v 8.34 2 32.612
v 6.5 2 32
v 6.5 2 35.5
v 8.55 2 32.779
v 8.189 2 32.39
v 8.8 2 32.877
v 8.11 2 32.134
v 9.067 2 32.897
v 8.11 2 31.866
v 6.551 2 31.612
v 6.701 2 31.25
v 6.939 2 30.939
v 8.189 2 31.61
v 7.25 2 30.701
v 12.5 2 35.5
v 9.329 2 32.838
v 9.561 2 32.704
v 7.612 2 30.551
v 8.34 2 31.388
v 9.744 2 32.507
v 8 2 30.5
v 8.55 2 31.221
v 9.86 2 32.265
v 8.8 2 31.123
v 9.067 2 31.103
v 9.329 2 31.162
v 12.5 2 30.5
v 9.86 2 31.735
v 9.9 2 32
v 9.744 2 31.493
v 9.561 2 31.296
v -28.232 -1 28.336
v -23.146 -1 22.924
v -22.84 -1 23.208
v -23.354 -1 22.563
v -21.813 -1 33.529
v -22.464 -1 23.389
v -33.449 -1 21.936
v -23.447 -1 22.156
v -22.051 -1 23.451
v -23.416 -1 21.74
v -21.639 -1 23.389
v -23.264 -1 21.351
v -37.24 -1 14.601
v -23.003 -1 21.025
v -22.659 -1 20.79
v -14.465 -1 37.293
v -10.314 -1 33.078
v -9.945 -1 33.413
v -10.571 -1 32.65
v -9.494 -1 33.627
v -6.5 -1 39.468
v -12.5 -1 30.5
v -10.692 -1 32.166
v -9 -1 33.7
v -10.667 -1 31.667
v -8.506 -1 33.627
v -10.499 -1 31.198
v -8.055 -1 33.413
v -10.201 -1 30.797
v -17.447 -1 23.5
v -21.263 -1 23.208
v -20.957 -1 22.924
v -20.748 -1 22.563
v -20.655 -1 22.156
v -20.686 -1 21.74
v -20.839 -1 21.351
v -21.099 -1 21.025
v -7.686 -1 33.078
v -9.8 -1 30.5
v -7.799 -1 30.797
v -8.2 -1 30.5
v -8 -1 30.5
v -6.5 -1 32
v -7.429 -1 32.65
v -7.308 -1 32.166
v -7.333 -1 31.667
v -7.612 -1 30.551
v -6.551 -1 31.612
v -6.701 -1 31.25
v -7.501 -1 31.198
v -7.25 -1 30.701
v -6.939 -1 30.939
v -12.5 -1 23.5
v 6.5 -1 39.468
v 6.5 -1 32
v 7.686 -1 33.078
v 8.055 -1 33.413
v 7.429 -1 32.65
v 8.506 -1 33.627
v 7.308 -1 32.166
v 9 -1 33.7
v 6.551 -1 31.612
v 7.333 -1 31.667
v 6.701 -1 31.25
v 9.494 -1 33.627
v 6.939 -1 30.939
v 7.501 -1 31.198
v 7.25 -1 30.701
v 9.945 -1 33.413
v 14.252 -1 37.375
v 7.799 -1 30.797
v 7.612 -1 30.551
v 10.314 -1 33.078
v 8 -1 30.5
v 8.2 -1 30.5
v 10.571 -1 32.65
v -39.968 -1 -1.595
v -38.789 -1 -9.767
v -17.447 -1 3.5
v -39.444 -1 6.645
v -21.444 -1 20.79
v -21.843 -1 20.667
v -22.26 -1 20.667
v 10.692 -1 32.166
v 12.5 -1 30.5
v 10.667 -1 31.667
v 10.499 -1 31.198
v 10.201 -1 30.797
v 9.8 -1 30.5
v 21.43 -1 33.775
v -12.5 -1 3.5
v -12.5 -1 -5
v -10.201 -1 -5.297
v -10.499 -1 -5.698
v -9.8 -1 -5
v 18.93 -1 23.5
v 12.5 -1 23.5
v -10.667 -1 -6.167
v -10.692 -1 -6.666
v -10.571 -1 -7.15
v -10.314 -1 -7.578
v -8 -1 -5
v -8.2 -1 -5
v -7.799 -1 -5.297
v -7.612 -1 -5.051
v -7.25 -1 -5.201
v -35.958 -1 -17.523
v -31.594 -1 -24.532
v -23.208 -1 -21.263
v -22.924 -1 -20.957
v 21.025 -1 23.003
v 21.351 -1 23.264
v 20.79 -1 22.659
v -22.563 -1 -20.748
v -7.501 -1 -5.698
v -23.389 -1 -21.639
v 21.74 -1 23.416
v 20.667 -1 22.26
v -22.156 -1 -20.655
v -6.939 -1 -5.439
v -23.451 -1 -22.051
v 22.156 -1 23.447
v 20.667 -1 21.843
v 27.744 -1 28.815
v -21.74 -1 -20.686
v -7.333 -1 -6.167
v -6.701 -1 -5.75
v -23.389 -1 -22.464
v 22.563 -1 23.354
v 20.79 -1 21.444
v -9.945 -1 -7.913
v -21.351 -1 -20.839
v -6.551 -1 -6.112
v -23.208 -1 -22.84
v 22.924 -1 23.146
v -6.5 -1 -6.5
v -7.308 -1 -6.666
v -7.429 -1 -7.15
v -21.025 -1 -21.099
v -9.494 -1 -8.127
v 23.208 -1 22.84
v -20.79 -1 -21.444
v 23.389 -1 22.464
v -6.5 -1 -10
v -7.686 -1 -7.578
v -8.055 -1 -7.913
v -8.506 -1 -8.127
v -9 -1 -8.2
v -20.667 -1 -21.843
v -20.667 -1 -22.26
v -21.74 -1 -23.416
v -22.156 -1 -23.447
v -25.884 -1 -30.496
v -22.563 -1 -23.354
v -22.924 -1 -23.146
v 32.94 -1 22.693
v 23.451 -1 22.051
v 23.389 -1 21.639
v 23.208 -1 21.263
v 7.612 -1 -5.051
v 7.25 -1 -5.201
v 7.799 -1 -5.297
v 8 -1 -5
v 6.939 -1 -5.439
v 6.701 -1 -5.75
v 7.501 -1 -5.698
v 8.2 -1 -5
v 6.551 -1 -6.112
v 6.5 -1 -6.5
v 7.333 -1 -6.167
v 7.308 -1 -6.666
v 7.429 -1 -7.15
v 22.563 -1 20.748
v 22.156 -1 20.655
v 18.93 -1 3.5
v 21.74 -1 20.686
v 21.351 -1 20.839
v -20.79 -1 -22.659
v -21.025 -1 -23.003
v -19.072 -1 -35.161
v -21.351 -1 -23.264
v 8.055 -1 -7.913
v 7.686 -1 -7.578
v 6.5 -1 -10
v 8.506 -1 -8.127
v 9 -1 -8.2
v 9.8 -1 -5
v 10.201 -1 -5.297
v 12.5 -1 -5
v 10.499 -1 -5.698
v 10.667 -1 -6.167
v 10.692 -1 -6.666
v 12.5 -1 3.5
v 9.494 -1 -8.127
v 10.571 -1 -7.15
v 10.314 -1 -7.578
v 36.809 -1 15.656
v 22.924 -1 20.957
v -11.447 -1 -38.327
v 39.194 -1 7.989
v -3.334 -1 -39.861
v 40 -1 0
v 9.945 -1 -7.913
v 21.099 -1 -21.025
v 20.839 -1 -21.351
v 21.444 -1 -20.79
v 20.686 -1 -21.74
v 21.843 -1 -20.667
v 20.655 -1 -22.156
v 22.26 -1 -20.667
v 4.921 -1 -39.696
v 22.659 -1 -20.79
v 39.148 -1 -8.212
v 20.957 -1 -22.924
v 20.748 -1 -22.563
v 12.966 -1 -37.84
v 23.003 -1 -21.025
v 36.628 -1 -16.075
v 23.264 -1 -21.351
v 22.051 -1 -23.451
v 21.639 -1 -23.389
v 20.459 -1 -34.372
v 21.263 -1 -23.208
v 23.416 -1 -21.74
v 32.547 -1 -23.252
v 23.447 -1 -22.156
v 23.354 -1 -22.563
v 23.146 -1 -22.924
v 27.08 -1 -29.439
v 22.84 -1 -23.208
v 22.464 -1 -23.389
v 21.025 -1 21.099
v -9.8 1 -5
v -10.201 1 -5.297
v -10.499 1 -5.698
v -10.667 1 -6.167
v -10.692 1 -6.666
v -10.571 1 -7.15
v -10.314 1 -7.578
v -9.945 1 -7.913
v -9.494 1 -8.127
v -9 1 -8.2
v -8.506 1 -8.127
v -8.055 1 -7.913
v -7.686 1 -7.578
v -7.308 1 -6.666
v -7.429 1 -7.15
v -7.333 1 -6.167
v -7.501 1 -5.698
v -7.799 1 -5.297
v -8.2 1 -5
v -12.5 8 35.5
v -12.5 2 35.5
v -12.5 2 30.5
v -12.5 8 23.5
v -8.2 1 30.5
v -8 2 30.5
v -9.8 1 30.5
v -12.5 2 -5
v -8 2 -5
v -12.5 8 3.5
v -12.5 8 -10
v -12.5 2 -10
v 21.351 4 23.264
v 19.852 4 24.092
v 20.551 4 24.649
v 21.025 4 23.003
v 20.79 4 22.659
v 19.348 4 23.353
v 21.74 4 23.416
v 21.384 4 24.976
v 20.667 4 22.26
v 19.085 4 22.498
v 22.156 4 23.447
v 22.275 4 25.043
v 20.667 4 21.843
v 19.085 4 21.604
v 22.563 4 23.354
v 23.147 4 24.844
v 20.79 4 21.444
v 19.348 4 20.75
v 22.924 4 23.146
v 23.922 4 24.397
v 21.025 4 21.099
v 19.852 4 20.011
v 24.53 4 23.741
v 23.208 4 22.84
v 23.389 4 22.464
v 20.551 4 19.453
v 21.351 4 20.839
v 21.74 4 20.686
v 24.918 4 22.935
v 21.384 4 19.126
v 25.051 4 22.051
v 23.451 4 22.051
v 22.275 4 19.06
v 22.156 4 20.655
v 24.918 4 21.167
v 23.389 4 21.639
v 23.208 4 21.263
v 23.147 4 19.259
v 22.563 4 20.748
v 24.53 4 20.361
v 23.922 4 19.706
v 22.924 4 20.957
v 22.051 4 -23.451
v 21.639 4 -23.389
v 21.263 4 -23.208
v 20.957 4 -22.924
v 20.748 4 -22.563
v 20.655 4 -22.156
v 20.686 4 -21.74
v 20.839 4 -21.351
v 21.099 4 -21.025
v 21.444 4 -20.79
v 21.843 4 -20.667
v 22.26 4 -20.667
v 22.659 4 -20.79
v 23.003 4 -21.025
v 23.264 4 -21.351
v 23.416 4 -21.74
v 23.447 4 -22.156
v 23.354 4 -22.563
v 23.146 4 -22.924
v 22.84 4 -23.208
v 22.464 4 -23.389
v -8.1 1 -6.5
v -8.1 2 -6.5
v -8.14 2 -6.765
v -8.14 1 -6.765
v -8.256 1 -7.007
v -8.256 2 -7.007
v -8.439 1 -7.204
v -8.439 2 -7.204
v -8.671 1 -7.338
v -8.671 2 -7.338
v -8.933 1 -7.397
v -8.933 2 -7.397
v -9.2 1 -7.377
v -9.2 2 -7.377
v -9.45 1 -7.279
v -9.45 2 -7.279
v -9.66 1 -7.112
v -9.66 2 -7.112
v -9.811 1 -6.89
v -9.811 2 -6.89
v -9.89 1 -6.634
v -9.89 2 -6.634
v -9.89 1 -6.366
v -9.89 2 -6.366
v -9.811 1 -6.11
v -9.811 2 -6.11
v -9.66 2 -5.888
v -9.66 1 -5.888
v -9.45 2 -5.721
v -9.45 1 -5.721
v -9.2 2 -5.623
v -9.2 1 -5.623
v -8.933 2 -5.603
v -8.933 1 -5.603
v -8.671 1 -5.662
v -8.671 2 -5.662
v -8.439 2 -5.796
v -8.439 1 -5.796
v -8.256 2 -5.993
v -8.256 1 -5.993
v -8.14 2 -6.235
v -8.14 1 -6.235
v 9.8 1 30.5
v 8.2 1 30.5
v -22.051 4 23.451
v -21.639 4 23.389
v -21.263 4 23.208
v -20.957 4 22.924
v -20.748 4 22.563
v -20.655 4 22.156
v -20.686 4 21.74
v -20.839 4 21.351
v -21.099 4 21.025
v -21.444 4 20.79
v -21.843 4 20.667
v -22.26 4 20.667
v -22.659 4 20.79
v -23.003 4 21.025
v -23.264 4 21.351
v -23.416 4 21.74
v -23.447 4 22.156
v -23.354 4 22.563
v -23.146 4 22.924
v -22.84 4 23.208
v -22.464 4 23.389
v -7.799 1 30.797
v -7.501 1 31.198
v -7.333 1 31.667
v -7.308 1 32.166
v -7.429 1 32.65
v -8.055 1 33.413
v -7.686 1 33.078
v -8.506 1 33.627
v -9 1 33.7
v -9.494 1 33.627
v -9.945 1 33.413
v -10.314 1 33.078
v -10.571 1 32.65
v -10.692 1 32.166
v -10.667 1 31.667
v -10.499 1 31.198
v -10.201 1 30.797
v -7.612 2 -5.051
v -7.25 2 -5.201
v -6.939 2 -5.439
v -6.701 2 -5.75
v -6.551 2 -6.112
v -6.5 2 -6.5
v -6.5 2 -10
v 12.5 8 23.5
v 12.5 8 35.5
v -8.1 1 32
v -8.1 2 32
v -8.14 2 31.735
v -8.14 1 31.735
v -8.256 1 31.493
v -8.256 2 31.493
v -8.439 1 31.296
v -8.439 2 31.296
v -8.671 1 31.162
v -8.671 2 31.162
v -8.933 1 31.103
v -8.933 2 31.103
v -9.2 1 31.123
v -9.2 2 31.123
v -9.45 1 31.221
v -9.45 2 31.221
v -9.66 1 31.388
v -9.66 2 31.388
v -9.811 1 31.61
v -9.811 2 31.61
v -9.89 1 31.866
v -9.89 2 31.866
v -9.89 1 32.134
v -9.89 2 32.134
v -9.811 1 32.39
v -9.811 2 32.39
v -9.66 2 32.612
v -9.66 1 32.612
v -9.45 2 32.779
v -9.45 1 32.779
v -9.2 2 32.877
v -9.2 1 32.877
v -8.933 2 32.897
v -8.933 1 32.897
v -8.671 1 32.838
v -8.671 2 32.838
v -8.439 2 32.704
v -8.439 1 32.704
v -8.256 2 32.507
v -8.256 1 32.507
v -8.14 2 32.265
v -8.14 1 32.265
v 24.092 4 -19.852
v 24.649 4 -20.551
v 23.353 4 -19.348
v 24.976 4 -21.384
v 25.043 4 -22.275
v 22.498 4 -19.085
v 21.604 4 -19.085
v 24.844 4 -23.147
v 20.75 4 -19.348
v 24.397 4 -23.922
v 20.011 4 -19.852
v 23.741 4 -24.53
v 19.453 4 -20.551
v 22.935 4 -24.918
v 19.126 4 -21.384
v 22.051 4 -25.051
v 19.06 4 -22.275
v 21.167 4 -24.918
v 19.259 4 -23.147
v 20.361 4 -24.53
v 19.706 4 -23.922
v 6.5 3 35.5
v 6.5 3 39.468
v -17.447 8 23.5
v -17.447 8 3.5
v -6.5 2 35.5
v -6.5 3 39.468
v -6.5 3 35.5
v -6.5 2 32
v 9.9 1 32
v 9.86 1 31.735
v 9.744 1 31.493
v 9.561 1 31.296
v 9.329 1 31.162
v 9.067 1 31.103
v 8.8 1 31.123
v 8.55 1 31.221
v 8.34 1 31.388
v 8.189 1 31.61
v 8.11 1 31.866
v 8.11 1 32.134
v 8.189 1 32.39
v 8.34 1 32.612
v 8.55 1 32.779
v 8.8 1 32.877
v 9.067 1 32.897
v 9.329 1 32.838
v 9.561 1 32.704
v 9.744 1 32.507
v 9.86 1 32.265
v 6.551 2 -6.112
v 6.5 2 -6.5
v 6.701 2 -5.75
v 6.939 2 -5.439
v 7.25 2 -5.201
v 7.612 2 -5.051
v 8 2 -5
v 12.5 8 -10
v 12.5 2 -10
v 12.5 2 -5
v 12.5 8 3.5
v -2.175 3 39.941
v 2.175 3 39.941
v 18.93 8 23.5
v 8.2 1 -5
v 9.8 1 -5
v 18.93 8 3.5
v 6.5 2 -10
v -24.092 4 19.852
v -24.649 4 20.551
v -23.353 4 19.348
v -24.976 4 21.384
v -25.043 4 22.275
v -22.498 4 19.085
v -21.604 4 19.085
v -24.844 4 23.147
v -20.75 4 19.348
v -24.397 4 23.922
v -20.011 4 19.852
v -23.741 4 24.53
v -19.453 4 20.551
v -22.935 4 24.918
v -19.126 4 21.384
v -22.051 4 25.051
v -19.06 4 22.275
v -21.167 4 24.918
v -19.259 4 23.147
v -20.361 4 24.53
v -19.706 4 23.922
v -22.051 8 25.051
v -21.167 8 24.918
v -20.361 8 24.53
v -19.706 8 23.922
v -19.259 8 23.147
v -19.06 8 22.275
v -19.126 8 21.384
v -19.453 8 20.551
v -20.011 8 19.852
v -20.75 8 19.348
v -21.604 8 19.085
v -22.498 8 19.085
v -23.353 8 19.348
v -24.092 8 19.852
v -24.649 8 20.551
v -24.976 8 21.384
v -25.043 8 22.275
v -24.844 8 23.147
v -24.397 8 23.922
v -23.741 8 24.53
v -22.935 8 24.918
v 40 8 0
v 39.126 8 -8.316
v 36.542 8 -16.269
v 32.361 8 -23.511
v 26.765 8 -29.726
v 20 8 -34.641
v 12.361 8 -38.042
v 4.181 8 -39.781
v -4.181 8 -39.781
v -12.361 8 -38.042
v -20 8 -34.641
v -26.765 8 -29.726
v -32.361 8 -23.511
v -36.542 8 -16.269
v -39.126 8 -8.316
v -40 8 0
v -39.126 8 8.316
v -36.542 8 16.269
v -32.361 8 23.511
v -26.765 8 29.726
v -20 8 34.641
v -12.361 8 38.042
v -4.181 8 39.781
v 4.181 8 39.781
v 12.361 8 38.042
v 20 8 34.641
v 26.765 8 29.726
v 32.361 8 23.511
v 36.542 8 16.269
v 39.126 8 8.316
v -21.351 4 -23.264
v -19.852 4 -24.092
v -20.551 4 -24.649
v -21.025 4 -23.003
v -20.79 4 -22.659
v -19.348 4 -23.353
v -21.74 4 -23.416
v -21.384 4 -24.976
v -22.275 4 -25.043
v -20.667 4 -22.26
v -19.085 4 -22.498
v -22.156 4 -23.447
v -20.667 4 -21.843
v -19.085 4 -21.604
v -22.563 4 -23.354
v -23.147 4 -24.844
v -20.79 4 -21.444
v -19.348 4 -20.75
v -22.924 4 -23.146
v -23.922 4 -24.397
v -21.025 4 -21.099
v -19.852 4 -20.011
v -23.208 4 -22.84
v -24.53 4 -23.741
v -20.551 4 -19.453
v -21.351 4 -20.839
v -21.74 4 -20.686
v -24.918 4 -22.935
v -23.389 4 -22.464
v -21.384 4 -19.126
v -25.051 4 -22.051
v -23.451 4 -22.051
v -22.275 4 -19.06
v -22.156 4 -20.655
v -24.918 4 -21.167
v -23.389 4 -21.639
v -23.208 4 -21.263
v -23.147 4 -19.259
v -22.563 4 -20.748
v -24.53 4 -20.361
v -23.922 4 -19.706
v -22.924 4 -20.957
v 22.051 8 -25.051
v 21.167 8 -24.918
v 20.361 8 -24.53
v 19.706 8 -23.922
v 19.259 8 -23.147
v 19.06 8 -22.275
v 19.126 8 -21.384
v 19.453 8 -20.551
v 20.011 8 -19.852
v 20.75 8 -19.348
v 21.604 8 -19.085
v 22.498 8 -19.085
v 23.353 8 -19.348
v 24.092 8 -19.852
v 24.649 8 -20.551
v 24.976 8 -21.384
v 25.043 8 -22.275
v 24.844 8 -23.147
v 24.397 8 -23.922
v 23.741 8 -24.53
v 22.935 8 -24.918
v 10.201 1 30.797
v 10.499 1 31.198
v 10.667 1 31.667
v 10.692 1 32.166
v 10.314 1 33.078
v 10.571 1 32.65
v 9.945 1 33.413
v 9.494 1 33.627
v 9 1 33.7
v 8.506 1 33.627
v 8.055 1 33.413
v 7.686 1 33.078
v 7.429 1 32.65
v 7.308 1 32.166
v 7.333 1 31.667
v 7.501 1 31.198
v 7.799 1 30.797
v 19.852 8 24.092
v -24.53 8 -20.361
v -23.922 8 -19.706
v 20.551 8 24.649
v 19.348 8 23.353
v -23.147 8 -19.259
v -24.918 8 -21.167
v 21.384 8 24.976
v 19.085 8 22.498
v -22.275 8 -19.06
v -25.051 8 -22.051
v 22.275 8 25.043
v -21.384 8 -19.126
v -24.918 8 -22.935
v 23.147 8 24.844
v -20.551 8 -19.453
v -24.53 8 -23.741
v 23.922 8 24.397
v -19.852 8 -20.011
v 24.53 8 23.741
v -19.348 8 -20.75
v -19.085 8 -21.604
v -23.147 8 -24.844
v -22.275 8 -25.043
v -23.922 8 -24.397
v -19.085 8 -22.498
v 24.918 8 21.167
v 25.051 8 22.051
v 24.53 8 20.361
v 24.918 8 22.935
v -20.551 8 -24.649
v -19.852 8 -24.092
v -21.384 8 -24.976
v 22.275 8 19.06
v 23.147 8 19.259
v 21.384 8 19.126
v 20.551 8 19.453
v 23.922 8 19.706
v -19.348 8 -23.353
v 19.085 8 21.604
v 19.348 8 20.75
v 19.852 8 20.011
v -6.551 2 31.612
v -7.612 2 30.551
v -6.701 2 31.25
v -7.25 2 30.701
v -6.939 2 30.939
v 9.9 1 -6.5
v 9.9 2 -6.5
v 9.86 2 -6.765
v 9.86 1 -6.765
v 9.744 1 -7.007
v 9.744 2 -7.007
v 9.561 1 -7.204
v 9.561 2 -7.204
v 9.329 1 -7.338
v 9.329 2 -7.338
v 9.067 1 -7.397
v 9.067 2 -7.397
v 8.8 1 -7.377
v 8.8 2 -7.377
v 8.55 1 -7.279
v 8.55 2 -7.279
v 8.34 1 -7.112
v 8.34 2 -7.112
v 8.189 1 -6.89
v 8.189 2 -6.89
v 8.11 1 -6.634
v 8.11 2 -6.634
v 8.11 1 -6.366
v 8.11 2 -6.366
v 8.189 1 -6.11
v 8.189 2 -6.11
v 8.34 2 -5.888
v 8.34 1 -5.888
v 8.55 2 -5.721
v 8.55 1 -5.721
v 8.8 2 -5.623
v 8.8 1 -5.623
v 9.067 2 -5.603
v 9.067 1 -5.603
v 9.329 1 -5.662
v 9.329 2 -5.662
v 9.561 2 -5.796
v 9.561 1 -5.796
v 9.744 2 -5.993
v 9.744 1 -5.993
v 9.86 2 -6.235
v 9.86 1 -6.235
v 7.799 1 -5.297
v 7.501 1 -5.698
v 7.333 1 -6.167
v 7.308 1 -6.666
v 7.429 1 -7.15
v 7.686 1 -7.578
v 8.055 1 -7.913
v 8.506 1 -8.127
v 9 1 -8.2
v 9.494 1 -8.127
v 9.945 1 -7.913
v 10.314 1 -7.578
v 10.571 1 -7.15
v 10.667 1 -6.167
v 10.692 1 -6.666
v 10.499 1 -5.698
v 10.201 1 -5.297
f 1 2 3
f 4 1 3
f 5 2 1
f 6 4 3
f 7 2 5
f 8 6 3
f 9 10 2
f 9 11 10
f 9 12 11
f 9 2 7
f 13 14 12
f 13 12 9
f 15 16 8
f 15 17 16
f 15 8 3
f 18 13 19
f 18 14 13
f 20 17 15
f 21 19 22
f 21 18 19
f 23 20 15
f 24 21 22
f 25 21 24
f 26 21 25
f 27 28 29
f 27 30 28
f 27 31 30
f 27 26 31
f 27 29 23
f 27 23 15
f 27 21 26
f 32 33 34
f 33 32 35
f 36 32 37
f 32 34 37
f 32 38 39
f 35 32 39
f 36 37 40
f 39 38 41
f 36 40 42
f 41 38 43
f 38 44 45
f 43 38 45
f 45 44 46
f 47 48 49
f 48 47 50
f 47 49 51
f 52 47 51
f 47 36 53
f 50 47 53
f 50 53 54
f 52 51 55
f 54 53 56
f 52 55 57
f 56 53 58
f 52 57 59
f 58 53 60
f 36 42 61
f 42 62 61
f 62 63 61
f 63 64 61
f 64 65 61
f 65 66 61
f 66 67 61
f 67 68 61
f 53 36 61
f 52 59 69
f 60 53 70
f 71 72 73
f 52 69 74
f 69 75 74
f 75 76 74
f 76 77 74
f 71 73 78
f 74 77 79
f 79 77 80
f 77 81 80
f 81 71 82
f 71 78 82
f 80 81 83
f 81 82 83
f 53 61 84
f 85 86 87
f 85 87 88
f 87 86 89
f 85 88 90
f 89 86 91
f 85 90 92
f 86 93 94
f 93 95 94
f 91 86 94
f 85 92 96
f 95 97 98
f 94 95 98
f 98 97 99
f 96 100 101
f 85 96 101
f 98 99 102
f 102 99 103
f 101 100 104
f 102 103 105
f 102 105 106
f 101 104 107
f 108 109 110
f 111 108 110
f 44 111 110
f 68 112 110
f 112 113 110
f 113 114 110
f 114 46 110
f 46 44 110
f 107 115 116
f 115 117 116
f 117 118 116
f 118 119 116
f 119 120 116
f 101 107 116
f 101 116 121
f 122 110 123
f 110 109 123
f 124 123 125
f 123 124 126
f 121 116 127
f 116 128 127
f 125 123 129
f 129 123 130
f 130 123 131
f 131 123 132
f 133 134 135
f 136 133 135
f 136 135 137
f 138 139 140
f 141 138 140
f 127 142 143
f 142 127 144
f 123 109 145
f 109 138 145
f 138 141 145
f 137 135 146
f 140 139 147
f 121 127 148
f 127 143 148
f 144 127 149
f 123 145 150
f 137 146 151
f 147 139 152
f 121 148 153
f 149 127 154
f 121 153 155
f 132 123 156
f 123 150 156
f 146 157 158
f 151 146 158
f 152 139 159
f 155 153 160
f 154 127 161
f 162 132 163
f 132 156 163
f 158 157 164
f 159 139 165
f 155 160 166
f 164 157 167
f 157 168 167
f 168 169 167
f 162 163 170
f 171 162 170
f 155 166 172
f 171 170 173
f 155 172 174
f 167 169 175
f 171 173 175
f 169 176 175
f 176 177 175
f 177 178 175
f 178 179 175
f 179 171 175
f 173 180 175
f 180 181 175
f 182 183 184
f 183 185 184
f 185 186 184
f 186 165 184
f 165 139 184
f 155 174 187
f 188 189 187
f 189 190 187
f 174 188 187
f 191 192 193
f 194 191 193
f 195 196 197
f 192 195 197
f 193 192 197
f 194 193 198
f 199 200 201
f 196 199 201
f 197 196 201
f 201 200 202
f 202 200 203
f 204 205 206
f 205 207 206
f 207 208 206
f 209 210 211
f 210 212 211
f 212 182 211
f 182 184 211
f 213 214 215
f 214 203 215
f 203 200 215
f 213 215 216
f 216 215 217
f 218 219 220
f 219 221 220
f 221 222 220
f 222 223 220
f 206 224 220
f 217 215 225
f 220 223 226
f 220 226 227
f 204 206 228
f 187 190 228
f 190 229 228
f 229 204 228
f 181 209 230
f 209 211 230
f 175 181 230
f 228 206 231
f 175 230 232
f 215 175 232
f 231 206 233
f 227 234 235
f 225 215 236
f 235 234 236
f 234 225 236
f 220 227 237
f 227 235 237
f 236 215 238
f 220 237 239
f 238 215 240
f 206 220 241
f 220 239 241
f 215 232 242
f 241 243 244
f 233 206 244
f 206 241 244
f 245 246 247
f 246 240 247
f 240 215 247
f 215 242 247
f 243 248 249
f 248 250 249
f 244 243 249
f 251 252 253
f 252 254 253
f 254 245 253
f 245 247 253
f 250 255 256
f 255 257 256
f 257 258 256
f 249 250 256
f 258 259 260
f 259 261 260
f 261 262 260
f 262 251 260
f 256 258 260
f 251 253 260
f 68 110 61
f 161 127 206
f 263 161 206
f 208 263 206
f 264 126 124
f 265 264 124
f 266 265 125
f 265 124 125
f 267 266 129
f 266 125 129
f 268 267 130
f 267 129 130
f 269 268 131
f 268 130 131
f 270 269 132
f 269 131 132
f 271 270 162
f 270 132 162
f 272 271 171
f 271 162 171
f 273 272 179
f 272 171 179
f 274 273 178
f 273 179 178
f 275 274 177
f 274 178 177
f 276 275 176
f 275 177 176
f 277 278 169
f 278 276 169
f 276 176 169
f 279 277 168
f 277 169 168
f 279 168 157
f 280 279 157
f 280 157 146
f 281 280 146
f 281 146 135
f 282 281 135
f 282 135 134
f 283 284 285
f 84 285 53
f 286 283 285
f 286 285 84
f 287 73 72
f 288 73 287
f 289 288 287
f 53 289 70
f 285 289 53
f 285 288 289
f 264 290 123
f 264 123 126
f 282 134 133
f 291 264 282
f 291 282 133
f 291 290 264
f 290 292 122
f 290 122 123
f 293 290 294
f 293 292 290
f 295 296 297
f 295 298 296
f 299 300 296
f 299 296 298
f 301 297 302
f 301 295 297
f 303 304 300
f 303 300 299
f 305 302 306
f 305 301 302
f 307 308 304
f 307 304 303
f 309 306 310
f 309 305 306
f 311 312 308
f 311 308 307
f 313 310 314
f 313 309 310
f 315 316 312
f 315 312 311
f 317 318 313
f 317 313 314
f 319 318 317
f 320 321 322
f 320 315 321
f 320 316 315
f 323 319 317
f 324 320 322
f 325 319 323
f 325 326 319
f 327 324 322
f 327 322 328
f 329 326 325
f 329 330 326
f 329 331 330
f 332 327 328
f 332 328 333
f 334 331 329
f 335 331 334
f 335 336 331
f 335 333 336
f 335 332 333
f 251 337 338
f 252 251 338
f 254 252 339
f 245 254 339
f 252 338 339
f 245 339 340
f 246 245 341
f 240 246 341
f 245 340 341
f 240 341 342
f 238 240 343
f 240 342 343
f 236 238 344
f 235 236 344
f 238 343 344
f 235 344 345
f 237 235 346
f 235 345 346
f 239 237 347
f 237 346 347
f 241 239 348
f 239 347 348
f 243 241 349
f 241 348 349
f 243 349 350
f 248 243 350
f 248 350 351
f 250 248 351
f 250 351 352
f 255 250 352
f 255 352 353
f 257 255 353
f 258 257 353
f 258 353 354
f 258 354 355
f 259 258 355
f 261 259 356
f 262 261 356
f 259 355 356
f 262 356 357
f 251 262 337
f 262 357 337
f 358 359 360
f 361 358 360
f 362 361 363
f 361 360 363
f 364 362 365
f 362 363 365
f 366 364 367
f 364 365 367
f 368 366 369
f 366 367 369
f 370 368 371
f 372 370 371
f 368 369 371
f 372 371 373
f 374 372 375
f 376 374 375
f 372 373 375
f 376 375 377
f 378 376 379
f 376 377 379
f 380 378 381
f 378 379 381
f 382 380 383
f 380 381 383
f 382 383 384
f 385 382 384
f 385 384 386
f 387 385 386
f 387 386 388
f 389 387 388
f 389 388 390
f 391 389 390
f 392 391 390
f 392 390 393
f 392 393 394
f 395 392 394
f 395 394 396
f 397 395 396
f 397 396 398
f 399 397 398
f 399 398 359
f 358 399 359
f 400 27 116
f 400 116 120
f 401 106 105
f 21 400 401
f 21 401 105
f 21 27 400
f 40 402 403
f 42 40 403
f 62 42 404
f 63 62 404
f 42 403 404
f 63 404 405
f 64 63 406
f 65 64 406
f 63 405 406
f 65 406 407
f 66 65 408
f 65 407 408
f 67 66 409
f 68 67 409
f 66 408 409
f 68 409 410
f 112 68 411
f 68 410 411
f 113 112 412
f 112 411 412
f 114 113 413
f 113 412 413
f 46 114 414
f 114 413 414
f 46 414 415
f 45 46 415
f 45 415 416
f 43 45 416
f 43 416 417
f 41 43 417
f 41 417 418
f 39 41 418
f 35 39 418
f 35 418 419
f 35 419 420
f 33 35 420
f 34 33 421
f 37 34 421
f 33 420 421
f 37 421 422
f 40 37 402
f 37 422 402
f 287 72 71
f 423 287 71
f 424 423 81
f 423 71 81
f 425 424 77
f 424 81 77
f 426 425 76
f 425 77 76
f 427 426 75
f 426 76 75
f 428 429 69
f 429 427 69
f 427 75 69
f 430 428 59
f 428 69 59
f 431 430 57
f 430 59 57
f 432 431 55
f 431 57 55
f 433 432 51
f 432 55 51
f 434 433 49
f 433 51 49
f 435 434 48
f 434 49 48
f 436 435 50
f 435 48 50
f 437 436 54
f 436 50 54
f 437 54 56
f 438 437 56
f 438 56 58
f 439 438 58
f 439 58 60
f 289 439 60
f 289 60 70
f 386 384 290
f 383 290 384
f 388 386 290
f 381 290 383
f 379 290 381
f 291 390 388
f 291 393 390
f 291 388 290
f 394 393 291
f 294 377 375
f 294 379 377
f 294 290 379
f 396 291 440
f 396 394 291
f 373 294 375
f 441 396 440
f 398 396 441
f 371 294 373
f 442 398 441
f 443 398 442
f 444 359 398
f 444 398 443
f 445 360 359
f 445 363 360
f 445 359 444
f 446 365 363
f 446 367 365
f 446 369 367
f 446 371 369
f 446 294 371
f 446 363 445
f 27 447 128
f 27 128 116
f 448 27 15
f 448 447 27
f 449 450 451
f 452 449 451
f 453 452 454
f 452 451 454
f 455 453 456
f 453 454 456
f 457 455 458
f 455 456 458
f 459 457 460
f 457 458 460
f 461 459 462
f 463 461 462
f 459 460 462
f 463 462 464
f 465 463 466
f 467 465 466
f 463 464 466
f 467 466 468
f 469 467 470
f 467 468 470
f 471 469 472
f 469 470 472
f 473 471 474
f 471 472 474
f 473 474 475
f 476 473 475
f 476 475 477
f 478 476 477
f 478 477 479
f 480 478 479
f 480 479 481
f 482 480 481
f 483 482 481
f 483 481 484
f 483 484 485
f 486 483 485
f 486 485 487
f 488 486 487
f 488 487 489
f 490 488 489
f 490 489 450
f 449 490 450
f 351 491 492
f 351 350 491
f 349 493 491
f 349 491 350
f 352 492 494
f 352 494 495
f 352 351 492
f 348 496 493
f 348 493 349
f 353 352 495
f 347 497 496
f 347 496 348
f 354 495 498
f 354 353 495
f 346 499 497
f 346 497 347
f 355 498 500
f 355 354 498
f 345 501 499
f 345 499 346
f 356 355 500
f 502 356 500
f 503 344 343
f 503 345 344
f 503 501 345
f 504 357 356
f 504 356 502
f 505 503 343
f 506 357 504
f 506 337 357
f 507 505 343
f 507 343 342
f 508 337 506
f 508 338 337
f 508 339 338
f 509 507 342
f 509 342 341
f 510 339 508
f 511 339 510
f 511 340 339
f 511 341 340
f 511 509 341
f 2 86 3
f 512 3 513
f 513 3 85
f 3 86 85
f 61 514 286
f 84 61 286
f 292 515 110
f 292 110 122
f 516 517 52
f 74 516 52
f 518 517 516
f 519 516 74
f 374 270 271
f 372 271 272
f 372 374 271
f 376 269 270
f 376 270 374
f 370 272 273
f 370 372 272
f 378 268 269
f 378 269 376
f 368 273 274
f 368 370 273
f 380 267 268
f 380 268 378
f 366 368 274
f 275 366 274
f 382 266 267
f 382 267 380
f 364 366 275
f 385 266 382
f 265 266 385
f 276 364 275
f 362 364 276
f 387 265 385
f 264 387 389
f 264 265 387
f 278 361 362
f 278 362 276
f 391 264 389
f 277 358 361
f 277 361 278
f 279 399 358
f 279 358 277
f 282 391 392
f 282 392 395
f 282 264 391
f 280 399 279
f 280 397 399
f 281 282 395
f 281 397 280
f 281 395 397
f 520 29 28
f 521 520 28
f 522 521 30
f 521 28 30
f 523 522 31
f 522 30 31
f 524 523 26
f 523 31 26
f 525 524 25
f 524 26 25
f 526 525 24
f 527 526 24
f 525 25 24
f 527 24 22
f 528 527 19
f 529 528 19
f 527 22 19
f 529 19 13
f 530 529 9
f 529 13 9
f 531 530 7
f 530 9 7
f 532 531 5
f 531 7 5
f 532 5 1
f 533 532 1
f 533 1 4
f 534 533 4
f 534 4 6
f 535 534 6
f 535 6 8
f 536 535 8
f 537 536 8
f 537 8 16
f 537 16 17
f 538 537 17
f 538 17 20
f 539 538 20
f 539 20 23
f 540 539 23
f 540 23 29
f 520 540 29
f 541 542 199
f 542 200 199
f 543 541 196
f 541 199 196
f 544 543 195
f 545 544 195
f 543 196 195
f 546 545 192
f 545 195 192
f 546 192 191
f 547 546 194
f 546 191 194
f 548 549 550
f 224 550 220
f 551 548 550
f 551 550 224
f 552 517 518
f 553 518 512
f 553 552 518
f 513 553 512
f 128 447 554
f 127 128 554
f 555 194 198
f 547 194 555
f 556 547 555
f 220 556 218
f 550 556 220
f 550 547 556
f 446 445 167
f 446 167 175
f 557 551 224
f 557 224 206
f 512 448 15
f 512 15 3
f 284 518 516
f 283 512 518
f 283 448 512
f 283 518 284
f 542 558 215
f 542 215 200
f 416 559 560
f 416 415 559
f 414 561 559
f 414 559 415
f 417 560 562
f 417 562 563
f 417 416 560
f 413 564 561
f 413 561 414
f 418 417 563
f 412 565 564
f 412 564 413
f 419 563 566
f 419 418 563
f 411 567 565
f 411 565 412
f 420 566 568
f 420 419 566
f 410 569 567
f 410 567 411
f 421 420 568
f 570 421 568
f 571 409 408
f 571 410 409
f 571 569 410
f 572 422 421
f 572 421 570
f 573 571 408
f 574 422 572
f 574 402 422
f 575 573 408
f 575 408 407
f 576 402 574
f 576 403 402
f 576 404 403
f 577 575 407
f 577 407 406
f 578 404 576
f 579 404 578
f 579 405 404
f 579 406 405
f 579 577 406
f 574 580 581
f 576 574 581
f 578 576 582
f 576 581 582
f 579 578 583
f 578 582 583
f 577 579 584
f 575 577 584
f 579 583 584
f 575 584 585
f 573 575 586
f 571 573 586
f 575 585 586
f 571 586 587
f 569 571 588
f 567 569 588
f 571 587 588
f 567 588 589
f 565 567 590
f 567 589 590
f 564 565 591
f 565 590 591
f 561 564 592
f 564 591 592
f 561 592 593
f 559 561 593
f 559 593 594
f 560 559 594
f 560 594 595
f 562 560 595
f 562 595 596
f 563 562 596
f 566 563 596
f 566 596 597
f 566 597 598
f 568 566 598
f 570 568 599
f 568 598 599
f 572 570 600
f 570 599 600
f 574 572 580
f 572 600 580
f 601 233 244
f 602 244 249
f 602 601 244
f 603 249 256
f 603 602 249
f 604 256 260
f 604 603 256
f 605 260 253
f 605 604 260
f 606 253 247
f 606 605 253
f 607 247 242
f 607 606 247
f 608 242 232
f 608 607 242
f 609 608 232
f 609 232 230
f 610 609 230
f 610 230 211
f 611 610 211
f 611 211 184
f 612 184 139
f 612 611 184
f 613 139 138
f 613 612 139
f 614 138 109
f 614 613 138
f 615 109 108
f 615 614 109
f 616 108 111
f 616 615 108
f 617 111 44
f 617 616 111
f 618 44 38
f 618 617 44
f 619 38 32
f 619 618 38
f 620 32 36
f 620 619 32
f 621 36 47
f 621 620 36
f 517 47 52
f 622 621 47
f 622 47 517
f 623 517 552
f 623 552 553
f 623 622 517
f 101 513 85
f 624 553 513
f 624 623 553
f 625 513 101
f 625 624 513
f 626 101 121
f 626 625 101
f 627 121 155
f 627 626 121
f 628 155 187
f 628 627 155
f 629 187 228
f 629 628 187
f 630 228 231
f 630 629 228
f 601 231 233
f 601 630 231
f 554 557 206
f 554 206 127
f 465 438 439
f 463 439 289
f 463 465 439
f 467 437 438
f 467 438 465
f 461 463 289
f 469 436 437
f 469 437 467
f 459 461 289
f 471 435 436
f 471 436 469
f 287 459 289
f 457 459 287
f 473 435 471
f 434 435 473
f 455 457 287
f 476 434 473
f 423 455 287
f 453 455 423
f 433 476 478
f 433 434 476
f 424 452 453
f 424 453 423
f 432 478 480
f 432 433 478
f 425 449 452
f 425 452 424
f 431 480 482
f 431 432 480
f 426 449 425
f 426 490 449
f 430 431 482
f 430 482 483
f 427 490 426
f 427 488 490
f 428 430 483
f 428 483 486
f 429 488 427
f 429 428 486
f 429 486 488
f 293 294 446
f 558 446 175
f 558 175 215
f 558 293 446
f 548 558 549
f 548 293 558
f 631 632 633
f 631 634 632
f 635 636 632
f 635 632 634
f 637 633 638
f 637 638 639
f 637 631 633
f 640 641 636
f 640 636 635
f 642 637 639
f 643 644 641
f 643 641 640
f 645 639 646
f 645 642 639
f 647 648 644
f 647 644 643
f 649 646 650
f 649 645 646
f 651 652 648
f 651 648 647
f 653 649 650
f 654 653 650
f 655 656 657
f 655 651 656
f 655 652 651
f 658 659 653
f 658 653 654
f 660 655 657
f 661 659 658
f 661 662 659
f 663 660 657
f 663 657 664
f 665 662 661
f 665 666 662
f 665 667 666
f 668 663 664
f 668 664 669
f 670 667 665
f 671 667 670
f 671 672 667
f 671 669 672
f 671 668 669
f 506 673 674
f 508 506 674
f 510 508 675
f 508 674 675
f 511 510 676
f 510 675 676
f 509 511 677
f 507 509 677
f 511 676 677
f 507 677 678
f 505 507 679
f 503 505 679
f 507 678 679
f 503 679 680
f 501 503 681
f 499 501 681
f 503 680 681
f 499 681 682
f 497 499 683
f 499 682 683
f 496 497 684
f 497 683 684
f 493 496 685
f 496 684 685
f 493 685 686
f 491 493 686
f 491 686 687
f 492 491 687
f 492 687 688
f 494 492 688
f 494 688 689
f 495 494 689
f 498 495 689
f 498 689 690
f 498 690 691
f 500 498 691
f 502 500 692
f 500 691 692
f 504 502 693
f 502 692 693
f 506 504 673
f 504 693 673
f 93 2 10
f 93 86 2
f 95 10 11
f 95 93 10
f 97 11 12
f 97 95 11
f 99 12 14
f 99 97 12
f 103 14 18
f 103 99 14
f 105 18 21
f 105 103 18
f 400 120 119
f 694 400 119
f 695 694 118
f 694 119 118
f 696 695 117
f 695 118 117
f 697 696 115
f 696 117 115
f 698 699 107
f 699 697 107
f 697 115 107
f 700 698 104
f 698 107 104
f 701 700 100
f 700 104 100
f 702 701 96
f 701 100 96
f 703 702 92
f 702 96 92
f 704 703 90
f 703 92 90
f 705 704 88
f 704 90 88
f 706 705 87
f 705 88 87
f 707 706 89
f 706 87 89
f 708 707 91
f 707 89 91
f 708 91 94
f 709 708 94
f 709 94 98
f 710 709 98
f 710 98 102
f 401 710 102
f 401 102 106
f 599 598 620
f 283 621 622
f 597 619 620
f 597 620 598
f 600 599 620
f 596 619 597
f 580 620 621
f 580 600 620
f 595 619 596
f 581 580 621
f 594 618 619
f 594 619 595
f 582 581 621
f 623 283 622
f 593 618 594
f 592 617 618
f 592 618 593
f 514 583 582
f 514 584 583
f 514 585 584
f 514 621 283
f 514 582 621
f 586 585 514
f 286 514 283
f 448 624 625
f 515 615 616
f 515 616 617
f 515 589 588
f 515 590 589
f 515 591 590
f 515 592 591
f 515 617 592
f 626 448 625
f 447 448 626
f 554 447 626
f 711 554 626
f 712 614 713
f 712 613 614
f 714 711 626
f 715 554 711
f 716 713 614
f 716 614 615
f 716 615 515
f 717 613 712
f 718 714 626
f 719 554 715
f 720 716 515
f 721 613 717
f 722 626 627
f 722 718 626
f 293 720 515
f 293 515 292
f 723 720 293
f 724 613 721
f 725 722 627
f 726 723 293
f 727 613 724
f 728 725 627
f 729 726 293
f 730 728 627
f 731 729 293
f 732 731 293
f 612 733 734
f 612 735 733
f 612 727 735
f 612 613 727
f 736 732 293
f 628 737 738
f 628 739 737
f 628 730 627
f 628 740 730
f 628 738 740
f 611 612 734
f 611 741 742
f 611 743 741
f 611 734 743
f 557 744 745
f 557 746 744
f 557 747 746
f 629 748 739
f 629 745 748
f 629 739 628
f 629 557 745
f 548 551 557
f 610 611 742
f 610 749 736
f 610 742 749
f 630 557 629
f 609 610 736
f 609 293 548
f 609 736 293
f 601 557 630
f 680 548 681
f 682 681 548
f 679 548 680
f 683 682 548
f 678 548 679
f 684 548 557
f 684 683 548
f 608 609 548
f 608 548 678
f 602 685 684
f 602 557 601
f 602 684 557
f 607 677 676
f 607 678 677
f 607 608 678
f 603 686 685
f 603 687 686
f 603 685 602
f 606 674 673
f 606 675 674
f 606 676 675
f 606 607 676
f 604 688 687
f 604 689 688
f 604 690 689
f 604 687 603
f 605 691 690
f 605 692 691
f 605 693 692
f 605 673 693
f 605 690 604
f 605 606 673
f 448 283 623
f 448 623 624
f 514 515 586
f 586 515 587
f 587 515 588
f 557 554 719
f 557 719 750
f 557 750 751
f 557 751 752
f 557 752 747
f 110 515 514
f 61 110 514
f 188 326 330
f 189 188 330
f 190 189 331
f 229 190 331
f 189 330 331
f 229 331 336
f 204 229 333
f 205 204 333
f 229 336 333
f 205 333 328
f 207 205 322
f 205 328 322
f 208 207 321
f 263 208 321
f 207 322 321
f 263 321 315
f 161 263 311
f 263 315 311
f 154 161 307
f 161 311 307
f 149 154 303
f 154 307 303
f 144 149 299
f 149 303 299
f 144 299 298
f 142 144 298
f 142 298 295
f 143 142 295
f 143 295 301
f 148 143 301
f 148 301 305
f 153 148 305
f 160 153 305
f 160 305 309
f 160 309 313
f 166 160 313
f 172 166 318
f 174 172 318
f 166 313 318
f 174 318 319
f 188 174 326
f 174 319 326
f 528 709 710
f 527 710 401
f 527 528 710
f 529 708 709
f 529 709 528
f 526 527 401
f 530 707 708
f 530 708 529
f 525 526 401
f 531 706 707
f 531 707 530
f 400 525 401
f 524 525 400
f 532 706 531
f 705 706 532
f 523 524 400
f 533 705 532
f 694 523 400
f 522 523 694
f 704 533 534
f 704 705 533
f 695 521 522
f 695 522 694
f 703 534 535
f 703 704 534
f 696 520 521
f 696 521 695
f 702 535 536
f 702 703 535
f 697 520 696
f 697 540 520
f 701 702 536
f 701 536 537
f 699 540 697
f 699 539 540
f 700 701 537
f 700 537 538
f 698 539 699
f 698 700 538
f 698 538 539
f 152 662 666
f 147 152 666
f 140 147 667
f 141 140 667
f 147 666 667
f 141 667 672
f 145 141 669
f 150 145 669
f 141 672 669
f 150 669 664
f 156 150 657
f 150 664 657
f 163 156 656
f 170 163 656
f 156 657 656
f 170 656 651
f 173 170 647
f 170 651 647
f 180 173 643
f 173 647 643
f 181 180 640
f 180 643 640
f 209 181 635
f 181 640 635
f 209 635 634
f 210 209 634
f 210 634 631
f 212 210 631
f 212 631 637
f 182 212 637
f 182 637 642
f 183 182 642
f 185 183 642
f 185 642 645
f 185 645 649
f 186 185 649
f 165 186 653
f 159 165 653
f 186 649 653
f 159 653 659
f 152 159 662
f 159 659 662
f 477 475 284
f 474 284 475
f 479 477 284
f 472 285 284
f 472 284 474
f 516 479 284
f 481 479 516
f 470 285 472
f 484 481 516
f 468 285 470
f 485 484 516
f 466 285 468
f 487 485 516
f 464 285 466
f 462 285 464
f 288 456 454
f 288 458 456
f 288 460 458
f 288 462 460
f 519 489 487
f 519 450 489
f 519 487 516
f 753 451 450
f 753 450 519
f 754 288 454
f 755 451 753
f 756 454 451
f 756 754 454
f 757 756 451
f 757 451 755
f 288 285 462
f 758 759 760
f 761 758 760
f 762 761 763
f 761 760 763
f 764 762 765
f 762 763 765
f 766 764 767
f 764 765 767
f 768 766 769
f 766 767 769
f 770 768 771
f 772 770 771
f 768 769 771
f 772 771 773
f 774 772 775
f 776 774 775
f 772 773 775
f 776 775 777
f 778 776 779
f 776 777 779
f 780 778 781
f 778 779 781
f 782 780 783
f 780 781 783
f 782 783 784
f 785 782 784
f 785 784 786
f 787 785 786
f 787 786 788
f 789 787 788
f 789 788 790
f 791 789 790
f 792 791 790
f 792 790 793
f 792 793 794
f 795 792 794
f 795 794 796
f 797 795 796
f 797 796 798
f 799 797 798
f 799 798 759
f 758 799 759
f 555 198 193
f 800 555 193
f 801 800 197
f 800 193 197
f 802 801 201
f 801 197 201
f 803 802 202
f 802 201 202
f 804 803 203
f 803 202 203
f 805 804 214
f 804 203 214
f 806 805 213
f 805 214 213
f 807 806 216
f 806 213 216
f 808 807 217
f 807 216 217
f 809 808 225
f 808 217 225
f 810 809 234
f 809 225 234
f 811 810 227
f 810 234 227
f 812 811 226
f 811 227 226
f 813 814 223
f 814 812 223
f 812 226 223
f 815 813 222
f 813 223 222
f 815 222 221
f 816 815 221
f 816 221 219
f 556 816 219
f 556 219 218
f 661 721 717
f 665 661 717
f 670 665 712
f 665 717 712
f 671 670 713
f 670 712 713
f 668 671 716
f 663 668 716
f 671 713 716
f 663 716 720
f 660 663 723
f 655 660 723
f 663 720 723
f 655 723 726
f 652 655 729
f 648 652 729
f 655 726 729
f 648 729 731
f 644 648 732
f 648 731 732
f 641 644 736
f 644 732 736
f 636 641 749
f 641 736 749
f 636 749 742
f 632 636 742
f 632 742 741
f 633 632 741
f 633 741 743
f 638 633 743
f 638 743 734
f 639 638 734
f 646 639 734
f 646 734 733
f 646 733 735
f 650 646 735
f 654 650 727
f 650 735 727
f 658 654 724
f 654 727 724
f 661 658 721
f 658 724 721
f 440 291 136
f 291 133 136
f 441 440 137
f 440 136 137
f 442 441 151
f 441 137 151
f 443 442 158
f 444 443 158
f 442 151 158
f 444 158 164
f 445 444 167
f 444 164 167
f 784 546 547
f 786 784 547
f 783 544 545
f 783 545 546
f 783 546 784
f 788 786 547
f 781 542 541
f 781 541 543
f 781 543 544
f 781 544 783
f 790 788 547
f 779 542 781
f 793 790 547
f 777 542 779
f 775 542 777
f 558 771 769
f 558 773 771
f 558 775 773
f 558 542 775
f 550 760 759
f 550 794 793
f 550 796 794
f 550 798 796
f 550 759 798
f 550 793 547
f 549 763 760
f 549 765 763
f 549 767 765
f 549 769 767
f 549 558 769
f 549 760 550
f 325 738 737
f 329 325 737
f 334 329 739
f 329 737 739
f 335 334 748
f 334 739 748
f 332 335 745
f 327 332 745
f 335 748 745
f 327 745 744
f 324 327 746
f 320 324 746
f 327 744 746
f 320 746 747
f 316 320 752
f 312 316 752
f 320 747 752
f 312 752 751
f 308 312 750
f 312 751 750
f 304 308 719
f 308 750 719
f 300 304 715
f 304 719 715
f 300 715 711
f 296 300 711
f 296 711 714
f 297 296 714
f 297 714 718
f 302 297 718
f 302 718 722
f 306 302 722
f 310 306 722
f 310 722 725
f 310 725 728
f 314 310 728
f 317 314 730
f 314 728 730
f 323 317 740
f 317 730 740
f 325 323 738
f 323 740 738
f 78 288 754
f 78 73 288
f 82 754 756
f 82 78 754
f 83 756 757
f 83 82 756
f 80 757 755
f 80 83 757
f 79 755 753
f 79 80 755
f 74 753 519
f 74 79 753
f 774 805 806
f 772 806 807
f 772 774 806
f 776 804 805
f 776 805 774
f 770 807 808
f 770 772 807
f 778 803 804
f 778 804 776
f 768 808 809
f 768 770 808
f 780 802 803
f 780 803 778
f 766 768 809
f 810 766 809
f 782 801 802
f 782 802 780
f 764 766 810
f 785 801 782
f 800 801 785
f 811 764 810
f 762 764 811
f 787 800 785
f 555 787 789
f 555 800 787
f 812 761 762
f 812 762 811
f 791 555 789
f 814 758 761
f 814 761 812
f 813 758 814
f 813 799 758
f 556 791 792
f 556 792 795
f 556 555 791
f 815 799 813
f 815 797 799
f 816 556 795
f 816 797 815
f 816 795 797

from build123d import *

# Parameters (mm, degrees)
SKETCH1_R                = 40
BOSS_EXTRUDE1_DEPTH      = 8
BOSS_EXTRUDE1_DEPTH_BACK = 1
SKETCH2_W                = 25
SKETCH2_H                = 45.5
CUT_EXTRUDE1_DEPTH       = 6
CUT_EXTRUDE2_DEPTH       = 6
SKETCH4_R                = 3
CUT_EXTRUDE3_DEPTH       = 4
SKETCH5_R                = 1.4
CUT_EXTRUDE4_DEPTH       = 5
CIRPATTERN1_COUNT        = 4
FILLET1_R                = 1.5
SKETCH6_W                = 13
SKETCH6_H                = 8.686825583
CUT_EXTRUDE5_DEPTH       = 4
CUT_EXTRUDE6_START       = -9
SKETCH7_W                = 36.377301766
SKETCH7_H                = 20
CUT_EXTRUDE6_DEPTH       = 9
SKETCH8_R                = 0.9
CUT_EXTRUDE7_DEPTH       = 4
SKETCH9_R                = 1.7
CUT_EXTRUDE10_DEPTH      = 2


with BuildPart() as part:
    # Sketch1 → Boss-Extrude1 (new body, two sides)
    with BuildSketch(Plane(origin=(0, 0, 0), x_dir=(1, 0, 0), z_dir=(0, 1, 0))) as boss_extrude1_sk:
        Circle(SKETCH1_R)
    extrude(amount=BOSS_EXTRUDE1_DEPTH)
    extrude(boss_extrude1_sk.sketch, amount=-BOSS_EXTRUDE1_DEPTH_BACK)

    # Sketch2 → Cut-Extrude1 (cut)
    with BuildSketch(Plane(origin=(0, 8, 0), x_dir=(1, 0, 0), z_dir=(0, 1, 0))):
        with Locations((0, -12.75)):
            Rectangle(SKETCH2_W, SKETCH2_H)
    extrude(amount=-CUT_EXTRUDE1_DEPTH, mode=Mode.SUBTRACT)

    # Sketch3 → Cut-Extrude2 (cut)
    with BuildSketch(Plane(origin=(0, 2, 0), x_dir=(1, 0, 0), z_dir=(0, 1, 0))):
        Polygon((-12.5, 5), (-6.5, 5), (-6.5, 10), (6.5, 10), (6.5, 5), (12.5, 5), (12.5, -30.5), (6.5, -30.5), (6.5, -35.5), (-6.5, -35.5), (-6.5, -30.5), (-12.5, -30.5), align=None)
    extrude(amount=-CUT_EXTRUDE2_DEPTH, mode=Mode.SUBTRACT)

    # Sketch4 → Cut-Extrude3 (cut)
    with BuildSketch(Plane(origin=(0, 8, 0), x_dir=(1, 0, 0), z_dir=(0, 1, 0))):
        with Locations((22.051187962, -22.051187962)):
            Circle(SKETCH4_R)
    cut_extrude3 = extrude(amount=-CUT_EXTRUDE3_DEPTH, mode=Mode.SUBTRACT)

    # Sketch5 → Cut-Extrude4 (cut)
    with BuildSketch(Plane(origin=(0, 4, 0), x_dir=(1, 0, 0), z_dir=(0, 1, 0))):
        with Locations((22.051187962, -22.051187962)):
            Circle(SKETCH5_R)
    cut_extrude4 = extrude(amount=-CUT_EXTRUDE4_DEPTH, mode=Mode.SUBTRACT)

    # CirPattern1: Cut-Extrude3, Cut-Extrude4 ×4 about axis
    cirpattern1_axis = Axis((0, 0, 0), (0, 1, 0))
    for i in range(1, CIRPATTERN1_COUNT):
        add(cut_extrude3.rotate(cirpattern1_axis, i * 360 / CIRPATTERN1_COUNT), mode=Mode.SUBTRACT)
        add(cut_extrude4.rotate(cirpattern1_axis, i * 360 / CIRPATTERN1_COUNT), mode=Mode.SUBTRACT)

    # Fillet1
    fillet1_edges = [part.edges().sort_by_distance(p)[0] for p in [
        (-6.5, 0.5, -5),
        (6.5, 0.5, -5),
        (6.5, 0.5, 30.5),
        (-6.5, 0.5, 30.5),
    ]]
    fillet(fillet1_edges, radius=FILLET1_R)

    # Sketch6 → Cut-Extrude5 (cut)
    with BuildSketch(Plane.XZ.offset(1)):
        with Locations((0, 39.843412792)):
            Rectangle(SKETCH6_W, SKETCH6_H)
    extrude(amount=-CUT_EXTRUDE5_DEPTH, mode=Mode.SUBTRACT)

    # Sketch7 → Cut-Extrude6 (cut)
    with BuildSketch(Plane.XZ.offset(1).offset(CUT_EXTRUDE6_START)):
        with Locations((0.741230287, 13.5)):
            Rectangle(SKETCH7_W, SKETCH7_H)
    extrude(amount=CUT_EXTRUDE6_DEPTH, mode=Mode.SUBTRACT)

    # Sketch8 → Cut-Extrude7 (cut)
    with BuildSketch(Plane(origin=(0, 2, 0), x_dir=(1, 0, 0), z_dir=(0, 1, 0))):
        with Locations((9, -32)):
            Circle(SKETCH8_R)
        with Locations((-9, -32)):
            Circle(SKETCH8_R)
        with Locations((-9, 6.5)):
            Circle(SKETCH8_R)
        with Locations((9, 6.5)):
            Circle(SKETCH8_R)
    extrude(amount=-CUT_EXTRUDE7_DEPTH, mode=Mode.SUBTRACT)

    # Sketch9 → Cut-Extrude10 (cut)
    with BuildSketch(Plane.XZ.offset(1)):
        with Locations((-9, -6.5)):
            Circle(SKETCH9_R)
        with Locations((9, -6.5)):
            Circle(SKETCH9_R)
        with Locations((9, 32)):
            Circle(SKETCH9_R)
        with Locations((-9, 32)):
            Circle(SKETCH9_R)
    extrude(amount=-CUT_EXTRUDE10_DEPTH, mode=Mode.SUBTRACT)


solid = part.part
